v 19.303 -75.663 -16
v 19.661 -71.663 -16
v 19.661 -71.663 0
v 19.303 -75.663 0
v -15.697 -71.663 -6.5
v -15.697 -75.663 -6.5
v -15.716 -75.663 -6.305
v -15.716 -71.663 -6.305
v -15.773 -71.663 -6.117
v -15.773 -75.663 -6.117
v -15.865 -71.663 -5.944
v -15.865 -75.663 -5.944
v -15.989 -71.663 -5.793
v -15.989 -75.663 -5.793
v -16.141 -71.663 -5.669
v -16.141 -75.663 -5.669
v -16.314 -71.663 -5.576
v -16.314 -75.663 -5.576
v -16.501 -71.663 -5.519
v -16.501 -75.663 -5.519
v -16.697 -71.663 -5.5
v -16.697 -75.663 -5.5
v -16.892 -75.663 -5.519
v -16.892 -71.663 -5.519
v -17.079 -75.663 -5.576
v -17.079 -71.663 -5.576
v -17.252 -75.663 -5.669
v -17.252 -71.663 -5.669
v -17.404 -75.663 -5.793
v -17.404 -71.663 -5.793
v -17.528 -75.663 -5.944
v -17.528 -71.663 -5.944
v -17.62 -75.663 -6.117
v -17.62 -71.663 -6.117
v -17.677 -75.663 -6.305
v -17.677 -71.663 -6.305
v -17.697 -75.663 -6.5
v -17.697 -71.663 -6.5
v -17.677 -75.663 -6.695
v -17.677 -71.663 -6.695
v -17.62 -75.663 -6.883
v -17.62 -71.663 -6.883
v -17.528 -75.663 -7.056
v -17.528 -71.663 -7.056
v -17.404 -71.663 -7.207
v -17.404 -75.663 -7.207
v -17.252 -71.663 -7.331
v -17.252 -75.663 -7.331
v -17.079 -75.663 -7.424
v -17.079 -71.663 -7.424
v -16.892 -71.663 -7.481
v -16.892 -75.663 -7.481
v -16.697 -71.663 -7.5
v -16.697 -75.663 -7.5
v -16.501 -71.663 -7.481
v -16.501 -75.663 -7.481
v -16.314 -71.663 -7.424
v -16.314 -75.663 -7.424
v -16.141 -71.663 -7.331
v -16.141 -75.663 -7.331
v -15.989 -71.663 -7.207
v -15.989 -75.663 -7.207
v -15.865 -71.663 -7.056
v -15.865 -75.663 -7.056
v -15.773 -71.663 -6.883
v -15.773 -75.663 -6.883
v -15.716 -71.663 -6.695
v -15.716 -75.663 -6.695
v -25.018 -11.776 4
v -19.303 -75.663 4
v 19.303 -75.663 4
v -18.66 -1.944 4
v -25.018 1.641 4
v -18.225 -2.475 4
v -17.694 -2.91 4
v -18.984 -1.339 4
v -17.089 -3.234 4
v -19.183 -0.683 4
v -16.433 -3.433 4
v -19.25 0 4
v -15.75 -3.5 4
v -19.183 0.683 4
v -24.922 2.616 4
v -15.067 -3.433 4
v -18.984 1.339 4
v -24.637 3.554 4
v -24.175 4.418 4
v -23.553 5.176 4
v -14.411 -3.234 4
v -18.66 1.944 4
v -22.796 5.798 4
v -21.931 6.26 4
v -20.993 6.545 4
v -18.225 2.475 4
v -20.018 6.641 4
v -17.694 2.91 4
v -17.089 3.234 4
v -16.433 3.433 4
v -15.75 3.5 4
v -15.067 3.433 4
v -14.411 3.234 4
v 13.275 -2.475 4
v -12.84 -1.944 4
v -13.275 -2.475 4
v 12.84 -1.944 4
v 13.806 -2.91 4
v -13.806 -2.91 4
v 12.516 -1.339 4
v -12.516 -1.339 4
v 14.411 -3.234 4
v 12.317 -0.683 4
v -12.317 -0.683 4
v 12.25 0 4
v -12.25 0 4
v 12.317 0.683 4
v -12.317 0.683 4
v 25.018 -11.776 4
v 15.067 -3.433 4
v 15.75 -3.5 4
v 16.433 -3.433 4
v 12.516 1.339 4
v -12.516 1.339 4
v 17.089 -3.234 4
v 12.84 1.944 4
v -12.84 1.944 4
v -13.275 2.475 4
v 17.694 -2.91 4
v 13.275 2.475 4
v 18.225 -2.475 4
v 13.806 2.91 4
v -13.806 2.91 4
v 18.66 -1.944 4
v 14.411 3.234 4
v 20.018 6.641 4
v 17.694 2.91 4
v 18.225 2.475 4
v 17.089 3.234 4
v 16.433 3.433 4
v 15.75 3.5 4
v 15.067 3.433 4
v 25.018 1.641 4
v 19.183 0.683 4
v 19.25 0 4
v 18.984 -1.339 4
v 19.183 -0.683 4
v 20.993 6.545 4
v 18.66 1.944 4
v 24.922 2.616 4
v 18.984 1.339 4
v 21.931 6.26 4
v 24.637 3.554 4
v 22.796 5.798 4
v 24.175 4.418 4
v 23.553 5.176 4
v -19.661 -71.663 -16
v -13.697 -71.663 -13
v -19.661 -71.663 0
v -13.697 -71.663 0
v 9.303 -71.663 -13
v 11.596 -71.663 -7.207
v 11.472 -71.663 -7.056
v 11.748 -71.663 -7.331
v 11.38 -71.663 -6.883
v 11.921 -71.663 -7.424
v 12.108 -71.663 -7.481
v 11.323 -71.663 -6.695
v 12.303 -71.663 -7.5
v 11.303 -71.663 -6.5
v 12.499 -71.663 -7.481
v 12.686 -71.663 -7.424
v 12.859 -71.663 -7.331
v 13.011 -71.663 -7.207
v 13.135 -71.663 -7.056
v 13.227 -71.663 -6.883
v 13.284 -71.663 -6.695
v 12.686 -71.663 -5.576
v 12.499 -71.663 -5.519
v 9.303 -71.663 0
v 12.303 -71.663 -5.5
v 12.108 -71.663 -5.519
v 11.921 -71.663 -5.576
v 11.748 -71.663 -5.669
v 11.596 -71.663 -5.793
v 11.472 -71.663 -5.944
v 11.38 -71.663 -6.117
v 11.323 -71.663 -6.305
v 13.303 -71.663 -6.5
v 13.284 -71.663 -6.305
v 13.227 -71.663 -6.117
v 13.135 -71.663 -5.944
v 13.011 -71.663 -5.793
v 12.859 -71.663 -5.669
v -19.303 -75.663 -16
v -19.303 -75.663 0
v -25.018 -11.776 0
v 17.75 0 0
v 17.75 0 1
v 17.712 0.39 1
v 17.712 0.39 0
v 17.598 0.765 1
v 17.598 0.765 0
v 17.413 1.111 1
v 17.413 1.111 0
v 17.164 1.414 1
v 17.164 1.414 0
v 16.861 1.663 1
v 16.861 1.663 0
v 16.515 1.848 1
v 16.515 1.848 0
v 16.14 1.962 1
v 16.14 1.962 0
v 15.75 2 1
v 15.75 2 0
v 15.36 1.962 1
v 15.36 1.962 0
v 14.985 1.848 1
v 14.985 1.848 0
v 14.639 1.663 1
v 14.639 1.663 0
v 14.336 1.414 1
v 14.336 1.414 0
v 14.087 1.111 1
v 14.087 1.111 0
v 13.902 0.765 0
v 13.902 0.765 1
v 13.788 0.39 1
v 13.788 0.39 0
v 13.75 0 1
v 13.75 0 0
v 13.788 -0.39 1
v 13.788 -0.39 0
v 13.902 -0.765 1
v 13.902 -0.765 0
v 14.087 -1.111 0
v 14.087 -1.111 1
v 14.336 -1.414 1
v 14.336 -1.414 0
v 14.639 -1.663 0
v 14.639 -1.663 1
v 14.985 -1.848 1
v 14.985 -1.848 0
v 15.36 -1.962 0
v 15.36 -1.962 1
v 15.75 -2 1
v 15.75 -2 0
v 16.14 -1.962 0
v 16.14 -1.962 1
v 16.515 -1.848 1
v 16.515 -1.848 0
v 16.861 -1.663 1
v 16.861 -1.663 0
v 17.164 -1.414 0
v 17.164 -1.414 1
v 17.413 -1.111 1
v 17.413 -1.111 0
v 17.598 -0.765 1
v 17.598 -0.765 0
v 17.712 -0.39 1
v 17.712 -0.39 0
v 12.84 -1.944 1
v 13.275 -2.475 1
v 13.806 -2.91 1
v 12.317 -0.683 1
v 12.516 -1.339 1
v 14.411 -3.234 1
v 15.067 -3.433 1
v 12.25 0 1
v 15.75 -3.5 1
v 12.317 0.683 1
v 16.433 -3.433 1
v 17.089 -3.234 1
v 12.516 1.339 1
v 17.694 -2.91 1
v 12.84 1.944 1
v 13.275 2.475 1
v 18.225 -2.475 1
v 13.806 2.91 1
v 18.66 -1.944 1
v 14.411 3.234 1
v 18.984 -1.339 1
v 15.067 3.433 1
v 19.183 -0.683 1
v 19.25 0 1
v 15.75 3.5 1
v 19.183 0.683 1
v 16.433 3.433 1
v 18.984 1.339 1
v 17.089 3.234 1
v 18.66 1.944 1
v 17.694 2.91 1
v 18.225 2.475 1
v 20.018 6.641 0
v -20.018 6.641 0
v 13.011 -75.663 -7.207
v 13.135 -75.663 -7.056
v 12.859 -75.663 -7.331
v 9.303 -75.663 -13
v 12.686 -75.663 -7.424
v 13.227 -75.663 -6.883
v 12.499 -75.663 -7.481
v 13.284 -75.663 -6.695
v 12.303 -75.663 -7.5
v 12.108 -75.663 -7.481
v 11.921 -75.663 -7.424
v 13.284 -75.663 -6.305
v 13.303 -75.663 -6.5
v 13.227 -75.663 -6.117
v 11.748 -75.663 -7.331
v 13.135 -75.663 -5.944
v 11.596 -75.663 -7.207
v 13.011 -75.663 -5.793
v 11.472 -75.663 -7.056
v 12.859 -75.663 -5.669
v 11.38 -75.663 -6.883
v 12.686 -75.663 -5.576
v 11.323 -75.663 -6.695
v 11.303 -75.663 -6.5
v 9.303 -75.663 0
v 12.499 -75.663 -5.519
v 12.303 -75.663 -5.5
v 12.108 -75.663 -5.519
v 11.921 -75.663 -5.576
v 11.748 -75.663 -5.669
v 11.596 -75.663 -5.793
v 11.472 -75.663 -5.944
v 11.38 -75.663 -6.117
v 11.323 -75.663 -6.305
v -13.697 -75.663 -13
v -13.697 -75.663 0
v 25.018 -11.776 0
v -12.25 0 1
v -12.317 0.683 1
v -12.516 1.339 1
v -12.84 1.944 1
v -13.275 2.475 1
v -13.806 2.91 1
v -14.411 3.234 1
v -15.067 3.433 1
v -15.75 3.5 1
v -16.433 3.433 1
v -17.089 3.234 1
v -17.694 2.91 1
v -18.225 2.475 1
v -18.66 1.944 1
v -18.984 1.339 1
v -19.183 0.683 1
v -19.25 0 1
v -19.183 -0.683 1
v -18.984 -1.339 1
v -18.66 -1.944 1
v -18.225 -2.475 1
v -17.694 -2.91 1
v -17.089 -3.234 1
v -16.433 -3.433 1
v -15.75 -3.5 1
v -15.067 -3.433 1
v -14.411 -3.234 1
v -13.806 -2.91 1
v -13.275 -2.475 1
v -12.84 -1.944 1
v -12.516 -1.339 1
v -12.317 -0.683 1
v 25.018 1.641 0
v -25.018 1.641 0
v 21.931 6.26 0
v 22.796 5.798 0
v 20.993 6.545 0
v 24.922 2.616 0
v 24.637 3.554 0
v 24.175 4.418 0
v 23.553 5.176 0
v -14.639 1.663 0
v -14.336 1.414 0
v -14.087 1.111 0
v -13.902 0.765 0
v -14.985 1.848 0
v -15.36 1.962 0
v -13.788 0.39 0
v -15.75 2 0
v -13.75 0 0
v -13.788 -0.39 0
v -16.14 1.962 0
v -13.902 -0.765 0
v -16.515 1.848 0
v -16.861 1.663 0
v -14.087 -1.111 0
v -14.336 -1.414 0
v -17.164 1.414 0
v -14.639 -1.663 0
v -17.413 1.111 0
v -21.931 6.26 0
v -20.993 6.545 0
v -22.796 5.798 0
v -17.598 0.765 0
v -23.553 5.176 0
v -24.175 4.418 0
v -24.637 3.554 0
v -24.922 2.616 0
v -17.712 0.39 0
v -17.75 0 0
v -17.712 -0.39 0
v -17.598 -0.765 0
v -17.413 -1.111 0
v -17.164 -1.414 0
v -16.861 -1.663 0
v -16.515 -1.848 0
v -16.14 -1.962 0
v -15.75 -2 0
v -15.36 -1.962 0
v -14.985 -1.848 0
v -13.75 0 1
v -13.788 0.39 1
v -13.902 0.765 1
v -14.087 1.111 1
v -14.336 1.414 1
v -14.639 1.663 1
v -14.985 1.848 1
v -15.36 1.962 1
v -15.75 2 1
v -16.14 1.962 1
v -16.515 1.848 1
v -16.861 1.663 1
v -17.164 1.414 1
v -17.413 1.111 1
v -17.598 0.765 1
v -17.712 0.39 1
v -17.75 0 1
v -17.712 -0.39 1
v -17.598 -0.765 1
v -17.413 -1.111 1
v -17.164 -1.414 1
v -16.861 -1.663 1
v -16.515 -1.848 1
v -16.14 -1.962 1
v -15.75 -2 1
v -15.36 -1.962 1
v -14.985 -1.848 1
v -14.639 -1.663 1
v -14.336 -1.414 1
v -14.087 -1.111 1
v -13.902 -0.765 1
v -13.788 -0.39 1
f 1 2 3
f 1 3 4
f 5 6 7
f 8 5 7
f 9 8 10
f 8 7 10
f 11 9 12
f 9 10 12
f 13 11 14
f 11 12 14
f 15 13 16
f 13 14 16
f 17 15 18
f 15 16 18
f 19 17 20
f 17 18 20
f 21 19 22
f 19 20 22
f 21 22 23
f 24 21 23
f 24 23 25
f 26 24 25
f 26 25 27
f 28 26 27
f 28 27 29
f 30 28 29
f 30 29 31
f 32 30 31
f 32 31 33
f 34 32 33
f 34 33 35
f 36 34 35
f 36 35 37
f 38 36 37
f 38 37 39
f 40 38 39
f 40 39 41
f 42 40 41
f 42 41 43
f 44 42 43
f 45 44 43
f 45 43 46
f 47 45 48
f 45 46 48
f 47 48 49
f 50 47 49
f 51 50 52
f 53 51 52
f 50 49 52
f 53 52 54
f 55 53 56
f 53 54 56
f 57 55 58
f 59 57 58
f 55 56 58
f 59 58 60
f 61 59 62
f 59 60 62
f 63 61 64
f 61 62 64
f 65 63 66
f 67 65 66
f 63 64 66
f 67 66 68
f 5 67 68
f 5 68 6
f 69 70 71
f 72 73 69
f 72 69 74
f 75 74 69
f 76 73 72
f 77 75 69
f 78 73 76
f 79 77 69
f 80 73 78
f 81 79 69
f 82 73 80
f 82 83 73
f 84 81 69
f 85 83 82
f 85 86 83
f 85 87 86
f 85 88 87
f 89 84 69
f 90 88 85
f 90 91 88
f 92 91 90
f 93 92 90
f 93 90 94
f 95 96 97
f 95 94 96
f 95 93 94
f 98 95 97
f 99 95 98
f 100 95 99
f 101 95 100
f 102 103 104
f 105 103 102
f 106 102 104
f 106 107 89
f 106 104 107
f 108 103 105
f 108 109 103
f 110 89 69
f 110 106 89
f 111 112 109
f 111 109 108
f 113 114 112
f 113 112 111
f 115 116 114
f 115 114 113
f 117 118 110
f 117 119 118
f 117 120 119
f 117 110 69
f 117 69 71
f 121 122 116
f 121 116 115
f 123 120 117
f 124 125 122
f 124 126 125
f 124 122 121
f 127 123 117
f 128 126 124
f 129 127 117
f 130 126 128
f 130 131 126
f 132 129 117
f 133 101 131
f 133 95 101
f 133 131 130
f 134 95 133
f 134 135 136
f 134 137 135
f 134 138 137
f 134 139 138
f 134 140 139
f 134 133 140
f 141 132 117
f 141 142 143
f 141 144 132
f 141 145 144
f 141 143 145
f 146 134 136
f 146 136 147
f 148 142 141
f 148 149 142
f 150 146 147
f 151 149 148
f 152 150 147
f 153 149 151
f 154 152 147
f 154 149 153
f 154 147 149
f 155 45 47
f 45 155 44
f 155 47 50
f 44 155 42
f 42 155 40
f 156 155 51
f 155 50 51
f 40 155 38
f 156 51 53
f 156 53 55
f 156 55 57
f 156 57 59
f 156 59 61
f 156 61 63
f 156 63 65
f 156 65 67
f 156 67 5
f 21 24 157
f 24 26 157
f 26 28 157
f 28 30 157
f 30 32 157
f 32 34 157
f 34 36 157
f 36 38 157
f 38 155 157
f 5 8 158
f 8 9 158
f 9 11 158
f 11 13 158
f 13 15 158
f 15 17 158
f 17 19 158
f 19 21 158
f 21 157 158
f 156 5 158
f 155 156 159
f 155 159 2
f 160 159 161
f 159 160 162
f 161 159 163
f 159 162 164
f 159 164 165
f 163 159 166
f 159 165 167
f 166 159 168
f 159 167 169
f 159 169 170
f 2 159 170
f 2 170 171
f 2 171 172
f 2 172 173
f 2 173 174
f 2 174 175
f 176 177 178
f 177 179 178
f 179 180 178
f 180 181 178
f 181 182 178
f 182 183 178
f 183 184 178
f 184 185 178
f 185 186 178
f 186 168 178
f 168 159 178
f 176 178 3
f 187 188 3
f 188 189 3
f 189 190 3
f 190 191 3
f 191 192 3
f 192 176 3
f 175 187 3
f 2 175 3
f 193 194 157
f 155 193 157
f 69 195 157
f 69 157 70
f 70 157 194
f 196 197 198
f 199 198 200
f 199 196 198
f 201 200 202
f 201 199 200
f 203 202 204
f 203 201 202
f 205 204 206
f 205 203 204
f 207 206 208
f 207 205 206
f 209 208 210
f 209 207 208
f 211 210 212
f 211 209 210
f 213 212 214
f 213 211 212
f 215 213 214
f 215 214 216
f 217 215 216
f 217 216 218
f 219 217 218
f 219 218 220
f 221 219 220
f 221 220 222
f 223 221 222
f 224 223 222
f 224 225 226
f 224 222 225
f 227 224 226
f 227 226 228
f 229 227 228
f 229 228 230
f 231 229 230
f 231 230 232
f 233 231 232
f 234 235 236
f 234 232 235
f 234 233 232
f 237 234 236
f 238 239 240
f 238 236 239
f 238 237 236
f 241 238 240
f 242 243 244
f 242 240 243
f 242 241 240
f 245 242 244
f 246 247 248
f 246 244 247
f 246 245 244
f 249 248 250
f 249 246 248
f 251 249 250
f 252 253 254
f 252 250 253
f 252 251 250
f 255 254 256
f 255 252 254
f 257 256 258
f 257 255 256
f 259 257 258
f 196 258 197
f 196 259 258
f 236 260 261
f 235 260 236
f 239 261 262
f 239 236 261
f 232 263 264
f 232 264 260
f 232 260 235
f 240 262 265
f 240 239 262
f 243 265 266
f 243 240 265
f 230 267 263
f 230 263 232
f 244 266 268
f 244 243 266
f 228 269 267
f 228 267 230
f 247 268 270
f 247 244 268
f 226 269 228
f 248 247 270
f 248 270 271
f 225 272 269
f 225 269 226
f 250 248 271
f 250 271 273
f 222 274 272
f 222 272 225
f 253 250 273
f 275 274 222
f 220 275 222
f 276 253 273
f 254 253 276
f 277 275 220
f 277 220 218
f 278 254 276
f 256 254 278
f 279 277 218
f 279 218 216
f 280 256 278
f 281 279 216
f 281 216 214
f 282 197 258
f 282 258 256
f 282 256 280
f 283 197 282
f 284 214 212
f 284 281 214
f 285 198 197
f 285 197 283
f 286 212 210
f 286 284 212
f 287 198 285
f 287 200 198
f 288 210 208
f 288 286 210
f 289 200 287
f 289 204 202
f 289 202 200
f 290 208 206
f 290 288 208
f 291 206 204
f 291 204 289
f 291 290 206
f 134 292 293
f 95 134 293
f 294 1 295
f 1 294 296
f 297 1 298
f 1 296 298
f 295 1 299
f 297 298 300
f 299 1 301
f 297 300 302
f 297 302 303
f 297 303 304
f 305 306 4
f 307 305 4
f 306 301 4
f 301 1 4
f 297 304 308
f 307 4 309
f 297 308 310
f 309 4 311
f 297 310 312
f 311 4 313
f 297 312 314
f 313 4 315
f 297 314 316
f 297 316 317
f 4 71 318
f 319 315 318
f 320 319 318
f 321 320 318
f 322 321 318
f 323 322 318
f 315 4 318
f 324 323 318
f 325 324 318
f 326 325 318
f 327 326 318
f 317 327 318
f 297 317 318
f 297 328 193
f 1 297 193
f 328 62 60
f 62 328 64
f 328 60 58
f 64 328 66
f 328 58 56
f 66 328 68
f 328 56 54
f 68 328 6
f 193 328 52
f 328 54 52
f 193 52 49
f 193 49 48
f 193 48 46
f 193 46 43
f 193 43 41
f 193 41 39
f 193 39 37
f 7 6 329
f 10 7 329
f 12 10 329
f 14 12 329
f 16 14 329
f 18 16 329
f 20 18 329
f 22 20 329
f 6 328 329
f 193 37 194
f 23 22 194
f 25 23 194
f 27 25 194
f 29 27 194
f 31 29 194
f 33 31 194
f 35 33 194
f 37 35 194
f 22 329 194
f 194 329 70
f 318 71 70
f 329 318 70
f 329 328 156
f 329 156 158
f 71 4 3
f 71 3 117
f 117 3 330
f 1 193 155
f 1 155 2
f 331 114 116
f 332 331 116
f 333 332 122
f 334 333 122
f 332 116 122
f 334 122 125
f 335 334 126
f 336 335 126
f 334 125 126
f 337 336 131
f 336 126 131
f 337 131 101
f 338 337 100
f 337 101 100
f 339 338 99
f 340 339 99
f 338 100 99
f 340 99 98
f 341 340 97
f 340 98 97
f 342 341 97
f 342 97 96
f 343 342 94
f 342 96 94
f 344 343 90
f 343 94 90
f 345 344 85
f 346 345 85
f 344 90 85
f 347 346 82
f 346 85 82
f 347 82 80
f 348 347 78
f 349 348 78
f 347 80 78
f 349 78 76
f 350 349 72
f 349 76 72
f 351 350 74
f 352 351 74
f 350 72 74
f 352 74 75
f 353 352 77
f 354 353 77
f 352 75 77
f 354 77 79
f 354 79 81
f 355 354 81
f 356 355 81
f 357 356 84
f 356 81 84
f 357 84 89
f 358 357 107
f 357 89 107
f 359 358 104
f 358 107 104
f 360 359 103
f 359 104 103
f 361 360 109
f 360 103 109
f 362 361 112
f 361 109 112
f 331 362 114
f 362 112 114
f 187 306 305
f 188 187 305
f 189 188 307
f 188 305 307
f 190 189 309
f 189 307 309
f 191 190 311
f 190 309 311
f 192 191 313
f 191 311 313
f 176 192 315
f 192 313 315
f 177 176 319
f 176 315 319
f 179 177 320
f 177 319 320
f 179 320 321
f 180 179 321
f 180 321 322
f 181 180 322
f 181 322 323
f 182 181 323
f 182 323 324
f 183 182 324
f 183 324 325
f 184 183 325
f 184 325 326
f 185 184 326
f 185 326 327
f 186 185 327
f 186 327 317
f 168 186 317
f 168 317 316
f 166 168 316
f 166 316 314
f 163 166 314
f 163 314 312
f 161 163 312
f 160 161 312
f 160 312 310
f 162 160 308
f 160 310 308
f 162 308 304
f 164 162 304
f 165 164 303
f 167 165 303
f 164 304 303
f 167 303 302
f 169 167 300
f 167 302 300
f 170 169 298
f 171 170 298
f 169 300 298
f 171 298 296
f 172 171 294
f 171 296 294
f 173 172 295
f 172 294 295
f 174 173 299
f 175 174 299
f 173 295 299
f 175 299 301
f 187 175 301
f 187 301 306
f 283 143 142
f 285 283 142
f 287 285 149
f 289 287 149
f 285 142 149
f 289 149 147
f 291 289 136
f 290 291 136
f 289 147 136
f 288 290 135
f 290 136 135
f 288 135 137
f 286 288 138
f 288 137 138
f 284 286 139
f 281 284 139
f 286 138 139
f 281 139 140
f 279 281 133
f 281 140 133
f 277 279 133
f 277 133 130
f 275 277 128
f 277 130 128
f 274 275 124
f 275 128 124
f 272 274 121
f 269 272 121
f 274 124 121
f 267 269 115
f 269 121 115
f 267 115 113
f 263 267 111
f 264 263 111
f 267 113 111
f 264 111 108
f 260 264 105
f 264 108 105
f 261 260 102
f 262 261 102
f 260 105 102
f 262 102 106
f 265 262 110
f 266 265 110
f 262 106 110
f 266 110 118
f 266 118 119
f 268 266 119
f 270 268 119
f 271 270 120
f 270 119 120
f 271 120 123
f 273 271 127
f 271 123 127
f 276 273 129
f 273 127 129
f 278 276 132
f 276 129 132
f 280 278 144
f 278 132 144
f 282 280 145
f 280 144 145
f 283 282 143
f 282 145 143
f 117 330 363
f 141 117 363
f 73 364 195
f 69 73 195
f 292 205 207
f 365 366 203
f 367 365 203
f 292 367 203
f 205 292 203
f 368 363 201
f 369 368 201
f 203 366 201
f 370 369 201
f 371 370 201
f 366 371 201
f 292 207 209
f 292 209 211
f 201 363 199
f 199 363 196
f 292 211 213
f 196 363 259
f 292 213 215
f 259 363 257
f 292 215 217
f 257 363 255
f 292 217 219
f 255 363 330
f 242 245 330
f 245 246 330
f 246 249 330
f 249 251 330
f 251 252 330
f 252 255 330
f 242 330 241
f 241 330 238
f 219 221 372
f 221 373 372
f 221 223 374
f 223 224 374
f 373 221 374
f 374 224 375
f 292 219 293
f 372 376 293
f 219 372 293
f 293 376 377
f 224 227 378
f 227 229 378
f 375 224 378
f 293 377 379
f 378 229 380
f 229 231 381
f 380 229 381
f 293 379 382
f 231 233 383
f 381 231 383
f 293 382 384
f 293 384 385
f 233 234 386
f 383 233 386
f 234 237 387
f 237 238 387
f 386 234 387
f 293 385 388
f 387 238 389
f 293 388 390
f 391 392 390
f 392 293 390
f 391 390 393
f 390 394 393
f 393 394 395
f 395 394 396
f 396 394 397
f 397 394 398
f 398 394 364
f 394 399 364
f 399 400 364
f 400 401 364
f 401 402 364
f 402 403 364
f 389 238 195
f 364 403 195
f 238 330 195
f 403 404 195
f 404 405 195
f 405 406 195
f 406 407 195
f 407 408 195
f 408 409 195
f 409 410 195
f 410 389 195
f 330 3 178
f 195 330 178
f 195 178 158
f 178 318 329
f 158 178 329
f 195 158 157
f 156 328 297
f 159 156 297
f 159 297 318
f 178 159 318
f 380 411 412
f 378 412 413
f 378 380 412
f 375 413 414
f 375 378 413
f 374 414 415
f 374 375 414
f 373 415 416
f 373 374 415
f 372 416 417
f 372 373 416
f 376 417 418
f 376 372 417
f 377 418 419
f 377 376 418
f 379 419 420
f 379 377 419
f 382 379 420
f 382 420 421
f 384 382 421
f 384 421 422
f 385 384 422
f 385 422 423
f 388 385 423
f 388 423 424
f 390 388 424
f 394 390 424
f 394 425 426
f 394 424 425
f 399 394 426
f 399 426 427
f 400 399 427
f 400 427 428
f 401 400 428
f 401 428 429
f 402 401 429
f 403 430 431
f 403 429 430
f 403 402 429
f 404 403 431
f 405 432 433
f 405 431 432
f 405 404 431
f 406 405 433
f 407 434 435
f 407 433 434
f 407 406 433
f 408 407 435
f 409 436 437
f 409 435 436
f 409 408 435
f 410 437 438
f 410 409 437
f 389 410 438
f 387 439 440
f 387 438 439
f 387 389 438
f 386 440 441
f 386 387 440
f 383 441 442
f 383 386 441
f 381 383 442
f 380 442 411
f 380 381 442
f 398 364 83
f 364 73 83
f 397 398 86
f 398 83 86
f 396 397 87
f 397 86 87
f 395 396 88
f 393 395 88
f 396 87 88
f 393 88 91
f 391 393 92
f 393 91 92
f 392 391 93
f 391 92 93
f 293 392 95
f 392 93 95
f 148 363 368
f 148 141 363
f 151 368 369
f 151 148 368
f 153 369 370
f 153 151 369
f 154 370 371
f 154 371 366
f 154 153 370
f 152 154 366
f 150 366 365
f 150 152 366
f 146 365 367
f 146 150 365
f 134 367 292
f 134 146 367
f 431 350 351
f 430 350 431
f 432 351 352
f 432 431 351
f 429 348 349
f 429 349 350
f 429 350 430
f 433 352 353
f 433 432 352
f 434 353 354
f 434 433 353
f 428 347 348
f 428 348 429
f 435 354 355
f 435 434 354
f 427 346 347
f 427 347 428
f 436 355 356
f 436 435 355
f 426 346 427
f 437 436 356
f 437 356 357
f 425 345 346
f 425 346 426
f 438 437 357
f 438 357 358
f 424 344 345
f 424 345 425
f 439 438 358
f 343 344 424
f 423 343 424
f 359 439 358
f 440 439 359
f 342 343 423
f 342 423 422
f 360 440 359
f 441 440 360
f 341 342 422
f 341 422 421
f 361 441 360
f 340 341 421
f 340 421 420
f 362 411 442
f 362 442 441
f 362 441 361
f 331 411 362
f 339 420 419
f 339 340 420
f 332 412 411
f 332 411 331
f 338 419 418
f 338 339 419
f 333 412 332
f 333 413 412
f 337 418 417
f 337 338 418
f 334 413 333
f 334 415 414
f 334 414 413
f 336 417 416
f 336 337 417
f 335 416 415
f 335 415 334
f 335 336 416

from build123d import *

# Parameters (mm, degrees)
F0_R     = 2
F1_DEPTH = 4
F2_R     = 3.5
F3_DEPTH = 3
F5_DEPTH = 16
F6_W     = 6
F6_H     = 13
F6_W_2   = 17
F6_R     = 1
F7_DEPTH = 25
F8_R     = 5


with BuildPart() as f1:
    # F0 (on Top) → F1 (new body)
    with BuildSketch(Plane.XY):
        Polygon((0, 6.640602), (-25.017791, 6.640602), (-25.017791, -11.776076), (-19.303476, -75.663209), (0, -75.663209), (19.303476, -75.663209), (25.017791, -11.776076), (25.017791, 6.640602), align=None)
        with Locations((-15.75, 0)):
            Circle(F0_R, mode=Mode.SUBTRACT)
        with Locations((15.75, 0)):
            Circle(F0_R, mode=Mode.SUBTRACT)
    extrude(amount=F1_DEPTH)

    # F2 (on face) → F3 (cut)
    with BuildSketch(Plane.XY.offset(4)):
        with Locations((-15.75, 0)):
            Circle(F2_R)
        with Locations((15.75, 0)):
            Circle(F2_R)
    extrude(amount=-F3_DEPTH, mode=Mode.SUBTRACT)

    # F4 (on face) → F5 (join)
    with BuildSketch(Plane(origin=(0, 0, 0), x_dir=(1, 0, 0), z_dir=(0, 0, -1))):
        Polygon((19.303476, 75.663209), (-19.303476, 75.663209), (-19.661252, 71.663209), (19.661252, 71.663209), align=None)
    extrude(amount=F5_DEPTH)

    # F6 (on face) → F7 (cut)
    with BuildSketch(Plane.XZ.offset(75.663209)):
        with Locations((6.303476, -6.5)):
            Rectangle(F6_W, F6_H)
        with Locations((-5.196524, -6.5)):
            Rectangle(F6_W_2, F6_H)
        with Locations((-16.696524, -6.5)):
            Circle(F6_R)
        with Locations((12.303476, -6.5)):
            Circle(F6_R)
    extrude(amount=-F7_DEPTH, mode=Mode.SUBTRACT)

    # F8
    f8_edges = [f1.edges().sort_by_distance(p)[0] for p in [
        (25.017791, 6.640602, 2),
        (-25.017791, 6.640602, 2),
    ]]
    fillet(f8_edges, radius=F8_R)


solid = f1.part
